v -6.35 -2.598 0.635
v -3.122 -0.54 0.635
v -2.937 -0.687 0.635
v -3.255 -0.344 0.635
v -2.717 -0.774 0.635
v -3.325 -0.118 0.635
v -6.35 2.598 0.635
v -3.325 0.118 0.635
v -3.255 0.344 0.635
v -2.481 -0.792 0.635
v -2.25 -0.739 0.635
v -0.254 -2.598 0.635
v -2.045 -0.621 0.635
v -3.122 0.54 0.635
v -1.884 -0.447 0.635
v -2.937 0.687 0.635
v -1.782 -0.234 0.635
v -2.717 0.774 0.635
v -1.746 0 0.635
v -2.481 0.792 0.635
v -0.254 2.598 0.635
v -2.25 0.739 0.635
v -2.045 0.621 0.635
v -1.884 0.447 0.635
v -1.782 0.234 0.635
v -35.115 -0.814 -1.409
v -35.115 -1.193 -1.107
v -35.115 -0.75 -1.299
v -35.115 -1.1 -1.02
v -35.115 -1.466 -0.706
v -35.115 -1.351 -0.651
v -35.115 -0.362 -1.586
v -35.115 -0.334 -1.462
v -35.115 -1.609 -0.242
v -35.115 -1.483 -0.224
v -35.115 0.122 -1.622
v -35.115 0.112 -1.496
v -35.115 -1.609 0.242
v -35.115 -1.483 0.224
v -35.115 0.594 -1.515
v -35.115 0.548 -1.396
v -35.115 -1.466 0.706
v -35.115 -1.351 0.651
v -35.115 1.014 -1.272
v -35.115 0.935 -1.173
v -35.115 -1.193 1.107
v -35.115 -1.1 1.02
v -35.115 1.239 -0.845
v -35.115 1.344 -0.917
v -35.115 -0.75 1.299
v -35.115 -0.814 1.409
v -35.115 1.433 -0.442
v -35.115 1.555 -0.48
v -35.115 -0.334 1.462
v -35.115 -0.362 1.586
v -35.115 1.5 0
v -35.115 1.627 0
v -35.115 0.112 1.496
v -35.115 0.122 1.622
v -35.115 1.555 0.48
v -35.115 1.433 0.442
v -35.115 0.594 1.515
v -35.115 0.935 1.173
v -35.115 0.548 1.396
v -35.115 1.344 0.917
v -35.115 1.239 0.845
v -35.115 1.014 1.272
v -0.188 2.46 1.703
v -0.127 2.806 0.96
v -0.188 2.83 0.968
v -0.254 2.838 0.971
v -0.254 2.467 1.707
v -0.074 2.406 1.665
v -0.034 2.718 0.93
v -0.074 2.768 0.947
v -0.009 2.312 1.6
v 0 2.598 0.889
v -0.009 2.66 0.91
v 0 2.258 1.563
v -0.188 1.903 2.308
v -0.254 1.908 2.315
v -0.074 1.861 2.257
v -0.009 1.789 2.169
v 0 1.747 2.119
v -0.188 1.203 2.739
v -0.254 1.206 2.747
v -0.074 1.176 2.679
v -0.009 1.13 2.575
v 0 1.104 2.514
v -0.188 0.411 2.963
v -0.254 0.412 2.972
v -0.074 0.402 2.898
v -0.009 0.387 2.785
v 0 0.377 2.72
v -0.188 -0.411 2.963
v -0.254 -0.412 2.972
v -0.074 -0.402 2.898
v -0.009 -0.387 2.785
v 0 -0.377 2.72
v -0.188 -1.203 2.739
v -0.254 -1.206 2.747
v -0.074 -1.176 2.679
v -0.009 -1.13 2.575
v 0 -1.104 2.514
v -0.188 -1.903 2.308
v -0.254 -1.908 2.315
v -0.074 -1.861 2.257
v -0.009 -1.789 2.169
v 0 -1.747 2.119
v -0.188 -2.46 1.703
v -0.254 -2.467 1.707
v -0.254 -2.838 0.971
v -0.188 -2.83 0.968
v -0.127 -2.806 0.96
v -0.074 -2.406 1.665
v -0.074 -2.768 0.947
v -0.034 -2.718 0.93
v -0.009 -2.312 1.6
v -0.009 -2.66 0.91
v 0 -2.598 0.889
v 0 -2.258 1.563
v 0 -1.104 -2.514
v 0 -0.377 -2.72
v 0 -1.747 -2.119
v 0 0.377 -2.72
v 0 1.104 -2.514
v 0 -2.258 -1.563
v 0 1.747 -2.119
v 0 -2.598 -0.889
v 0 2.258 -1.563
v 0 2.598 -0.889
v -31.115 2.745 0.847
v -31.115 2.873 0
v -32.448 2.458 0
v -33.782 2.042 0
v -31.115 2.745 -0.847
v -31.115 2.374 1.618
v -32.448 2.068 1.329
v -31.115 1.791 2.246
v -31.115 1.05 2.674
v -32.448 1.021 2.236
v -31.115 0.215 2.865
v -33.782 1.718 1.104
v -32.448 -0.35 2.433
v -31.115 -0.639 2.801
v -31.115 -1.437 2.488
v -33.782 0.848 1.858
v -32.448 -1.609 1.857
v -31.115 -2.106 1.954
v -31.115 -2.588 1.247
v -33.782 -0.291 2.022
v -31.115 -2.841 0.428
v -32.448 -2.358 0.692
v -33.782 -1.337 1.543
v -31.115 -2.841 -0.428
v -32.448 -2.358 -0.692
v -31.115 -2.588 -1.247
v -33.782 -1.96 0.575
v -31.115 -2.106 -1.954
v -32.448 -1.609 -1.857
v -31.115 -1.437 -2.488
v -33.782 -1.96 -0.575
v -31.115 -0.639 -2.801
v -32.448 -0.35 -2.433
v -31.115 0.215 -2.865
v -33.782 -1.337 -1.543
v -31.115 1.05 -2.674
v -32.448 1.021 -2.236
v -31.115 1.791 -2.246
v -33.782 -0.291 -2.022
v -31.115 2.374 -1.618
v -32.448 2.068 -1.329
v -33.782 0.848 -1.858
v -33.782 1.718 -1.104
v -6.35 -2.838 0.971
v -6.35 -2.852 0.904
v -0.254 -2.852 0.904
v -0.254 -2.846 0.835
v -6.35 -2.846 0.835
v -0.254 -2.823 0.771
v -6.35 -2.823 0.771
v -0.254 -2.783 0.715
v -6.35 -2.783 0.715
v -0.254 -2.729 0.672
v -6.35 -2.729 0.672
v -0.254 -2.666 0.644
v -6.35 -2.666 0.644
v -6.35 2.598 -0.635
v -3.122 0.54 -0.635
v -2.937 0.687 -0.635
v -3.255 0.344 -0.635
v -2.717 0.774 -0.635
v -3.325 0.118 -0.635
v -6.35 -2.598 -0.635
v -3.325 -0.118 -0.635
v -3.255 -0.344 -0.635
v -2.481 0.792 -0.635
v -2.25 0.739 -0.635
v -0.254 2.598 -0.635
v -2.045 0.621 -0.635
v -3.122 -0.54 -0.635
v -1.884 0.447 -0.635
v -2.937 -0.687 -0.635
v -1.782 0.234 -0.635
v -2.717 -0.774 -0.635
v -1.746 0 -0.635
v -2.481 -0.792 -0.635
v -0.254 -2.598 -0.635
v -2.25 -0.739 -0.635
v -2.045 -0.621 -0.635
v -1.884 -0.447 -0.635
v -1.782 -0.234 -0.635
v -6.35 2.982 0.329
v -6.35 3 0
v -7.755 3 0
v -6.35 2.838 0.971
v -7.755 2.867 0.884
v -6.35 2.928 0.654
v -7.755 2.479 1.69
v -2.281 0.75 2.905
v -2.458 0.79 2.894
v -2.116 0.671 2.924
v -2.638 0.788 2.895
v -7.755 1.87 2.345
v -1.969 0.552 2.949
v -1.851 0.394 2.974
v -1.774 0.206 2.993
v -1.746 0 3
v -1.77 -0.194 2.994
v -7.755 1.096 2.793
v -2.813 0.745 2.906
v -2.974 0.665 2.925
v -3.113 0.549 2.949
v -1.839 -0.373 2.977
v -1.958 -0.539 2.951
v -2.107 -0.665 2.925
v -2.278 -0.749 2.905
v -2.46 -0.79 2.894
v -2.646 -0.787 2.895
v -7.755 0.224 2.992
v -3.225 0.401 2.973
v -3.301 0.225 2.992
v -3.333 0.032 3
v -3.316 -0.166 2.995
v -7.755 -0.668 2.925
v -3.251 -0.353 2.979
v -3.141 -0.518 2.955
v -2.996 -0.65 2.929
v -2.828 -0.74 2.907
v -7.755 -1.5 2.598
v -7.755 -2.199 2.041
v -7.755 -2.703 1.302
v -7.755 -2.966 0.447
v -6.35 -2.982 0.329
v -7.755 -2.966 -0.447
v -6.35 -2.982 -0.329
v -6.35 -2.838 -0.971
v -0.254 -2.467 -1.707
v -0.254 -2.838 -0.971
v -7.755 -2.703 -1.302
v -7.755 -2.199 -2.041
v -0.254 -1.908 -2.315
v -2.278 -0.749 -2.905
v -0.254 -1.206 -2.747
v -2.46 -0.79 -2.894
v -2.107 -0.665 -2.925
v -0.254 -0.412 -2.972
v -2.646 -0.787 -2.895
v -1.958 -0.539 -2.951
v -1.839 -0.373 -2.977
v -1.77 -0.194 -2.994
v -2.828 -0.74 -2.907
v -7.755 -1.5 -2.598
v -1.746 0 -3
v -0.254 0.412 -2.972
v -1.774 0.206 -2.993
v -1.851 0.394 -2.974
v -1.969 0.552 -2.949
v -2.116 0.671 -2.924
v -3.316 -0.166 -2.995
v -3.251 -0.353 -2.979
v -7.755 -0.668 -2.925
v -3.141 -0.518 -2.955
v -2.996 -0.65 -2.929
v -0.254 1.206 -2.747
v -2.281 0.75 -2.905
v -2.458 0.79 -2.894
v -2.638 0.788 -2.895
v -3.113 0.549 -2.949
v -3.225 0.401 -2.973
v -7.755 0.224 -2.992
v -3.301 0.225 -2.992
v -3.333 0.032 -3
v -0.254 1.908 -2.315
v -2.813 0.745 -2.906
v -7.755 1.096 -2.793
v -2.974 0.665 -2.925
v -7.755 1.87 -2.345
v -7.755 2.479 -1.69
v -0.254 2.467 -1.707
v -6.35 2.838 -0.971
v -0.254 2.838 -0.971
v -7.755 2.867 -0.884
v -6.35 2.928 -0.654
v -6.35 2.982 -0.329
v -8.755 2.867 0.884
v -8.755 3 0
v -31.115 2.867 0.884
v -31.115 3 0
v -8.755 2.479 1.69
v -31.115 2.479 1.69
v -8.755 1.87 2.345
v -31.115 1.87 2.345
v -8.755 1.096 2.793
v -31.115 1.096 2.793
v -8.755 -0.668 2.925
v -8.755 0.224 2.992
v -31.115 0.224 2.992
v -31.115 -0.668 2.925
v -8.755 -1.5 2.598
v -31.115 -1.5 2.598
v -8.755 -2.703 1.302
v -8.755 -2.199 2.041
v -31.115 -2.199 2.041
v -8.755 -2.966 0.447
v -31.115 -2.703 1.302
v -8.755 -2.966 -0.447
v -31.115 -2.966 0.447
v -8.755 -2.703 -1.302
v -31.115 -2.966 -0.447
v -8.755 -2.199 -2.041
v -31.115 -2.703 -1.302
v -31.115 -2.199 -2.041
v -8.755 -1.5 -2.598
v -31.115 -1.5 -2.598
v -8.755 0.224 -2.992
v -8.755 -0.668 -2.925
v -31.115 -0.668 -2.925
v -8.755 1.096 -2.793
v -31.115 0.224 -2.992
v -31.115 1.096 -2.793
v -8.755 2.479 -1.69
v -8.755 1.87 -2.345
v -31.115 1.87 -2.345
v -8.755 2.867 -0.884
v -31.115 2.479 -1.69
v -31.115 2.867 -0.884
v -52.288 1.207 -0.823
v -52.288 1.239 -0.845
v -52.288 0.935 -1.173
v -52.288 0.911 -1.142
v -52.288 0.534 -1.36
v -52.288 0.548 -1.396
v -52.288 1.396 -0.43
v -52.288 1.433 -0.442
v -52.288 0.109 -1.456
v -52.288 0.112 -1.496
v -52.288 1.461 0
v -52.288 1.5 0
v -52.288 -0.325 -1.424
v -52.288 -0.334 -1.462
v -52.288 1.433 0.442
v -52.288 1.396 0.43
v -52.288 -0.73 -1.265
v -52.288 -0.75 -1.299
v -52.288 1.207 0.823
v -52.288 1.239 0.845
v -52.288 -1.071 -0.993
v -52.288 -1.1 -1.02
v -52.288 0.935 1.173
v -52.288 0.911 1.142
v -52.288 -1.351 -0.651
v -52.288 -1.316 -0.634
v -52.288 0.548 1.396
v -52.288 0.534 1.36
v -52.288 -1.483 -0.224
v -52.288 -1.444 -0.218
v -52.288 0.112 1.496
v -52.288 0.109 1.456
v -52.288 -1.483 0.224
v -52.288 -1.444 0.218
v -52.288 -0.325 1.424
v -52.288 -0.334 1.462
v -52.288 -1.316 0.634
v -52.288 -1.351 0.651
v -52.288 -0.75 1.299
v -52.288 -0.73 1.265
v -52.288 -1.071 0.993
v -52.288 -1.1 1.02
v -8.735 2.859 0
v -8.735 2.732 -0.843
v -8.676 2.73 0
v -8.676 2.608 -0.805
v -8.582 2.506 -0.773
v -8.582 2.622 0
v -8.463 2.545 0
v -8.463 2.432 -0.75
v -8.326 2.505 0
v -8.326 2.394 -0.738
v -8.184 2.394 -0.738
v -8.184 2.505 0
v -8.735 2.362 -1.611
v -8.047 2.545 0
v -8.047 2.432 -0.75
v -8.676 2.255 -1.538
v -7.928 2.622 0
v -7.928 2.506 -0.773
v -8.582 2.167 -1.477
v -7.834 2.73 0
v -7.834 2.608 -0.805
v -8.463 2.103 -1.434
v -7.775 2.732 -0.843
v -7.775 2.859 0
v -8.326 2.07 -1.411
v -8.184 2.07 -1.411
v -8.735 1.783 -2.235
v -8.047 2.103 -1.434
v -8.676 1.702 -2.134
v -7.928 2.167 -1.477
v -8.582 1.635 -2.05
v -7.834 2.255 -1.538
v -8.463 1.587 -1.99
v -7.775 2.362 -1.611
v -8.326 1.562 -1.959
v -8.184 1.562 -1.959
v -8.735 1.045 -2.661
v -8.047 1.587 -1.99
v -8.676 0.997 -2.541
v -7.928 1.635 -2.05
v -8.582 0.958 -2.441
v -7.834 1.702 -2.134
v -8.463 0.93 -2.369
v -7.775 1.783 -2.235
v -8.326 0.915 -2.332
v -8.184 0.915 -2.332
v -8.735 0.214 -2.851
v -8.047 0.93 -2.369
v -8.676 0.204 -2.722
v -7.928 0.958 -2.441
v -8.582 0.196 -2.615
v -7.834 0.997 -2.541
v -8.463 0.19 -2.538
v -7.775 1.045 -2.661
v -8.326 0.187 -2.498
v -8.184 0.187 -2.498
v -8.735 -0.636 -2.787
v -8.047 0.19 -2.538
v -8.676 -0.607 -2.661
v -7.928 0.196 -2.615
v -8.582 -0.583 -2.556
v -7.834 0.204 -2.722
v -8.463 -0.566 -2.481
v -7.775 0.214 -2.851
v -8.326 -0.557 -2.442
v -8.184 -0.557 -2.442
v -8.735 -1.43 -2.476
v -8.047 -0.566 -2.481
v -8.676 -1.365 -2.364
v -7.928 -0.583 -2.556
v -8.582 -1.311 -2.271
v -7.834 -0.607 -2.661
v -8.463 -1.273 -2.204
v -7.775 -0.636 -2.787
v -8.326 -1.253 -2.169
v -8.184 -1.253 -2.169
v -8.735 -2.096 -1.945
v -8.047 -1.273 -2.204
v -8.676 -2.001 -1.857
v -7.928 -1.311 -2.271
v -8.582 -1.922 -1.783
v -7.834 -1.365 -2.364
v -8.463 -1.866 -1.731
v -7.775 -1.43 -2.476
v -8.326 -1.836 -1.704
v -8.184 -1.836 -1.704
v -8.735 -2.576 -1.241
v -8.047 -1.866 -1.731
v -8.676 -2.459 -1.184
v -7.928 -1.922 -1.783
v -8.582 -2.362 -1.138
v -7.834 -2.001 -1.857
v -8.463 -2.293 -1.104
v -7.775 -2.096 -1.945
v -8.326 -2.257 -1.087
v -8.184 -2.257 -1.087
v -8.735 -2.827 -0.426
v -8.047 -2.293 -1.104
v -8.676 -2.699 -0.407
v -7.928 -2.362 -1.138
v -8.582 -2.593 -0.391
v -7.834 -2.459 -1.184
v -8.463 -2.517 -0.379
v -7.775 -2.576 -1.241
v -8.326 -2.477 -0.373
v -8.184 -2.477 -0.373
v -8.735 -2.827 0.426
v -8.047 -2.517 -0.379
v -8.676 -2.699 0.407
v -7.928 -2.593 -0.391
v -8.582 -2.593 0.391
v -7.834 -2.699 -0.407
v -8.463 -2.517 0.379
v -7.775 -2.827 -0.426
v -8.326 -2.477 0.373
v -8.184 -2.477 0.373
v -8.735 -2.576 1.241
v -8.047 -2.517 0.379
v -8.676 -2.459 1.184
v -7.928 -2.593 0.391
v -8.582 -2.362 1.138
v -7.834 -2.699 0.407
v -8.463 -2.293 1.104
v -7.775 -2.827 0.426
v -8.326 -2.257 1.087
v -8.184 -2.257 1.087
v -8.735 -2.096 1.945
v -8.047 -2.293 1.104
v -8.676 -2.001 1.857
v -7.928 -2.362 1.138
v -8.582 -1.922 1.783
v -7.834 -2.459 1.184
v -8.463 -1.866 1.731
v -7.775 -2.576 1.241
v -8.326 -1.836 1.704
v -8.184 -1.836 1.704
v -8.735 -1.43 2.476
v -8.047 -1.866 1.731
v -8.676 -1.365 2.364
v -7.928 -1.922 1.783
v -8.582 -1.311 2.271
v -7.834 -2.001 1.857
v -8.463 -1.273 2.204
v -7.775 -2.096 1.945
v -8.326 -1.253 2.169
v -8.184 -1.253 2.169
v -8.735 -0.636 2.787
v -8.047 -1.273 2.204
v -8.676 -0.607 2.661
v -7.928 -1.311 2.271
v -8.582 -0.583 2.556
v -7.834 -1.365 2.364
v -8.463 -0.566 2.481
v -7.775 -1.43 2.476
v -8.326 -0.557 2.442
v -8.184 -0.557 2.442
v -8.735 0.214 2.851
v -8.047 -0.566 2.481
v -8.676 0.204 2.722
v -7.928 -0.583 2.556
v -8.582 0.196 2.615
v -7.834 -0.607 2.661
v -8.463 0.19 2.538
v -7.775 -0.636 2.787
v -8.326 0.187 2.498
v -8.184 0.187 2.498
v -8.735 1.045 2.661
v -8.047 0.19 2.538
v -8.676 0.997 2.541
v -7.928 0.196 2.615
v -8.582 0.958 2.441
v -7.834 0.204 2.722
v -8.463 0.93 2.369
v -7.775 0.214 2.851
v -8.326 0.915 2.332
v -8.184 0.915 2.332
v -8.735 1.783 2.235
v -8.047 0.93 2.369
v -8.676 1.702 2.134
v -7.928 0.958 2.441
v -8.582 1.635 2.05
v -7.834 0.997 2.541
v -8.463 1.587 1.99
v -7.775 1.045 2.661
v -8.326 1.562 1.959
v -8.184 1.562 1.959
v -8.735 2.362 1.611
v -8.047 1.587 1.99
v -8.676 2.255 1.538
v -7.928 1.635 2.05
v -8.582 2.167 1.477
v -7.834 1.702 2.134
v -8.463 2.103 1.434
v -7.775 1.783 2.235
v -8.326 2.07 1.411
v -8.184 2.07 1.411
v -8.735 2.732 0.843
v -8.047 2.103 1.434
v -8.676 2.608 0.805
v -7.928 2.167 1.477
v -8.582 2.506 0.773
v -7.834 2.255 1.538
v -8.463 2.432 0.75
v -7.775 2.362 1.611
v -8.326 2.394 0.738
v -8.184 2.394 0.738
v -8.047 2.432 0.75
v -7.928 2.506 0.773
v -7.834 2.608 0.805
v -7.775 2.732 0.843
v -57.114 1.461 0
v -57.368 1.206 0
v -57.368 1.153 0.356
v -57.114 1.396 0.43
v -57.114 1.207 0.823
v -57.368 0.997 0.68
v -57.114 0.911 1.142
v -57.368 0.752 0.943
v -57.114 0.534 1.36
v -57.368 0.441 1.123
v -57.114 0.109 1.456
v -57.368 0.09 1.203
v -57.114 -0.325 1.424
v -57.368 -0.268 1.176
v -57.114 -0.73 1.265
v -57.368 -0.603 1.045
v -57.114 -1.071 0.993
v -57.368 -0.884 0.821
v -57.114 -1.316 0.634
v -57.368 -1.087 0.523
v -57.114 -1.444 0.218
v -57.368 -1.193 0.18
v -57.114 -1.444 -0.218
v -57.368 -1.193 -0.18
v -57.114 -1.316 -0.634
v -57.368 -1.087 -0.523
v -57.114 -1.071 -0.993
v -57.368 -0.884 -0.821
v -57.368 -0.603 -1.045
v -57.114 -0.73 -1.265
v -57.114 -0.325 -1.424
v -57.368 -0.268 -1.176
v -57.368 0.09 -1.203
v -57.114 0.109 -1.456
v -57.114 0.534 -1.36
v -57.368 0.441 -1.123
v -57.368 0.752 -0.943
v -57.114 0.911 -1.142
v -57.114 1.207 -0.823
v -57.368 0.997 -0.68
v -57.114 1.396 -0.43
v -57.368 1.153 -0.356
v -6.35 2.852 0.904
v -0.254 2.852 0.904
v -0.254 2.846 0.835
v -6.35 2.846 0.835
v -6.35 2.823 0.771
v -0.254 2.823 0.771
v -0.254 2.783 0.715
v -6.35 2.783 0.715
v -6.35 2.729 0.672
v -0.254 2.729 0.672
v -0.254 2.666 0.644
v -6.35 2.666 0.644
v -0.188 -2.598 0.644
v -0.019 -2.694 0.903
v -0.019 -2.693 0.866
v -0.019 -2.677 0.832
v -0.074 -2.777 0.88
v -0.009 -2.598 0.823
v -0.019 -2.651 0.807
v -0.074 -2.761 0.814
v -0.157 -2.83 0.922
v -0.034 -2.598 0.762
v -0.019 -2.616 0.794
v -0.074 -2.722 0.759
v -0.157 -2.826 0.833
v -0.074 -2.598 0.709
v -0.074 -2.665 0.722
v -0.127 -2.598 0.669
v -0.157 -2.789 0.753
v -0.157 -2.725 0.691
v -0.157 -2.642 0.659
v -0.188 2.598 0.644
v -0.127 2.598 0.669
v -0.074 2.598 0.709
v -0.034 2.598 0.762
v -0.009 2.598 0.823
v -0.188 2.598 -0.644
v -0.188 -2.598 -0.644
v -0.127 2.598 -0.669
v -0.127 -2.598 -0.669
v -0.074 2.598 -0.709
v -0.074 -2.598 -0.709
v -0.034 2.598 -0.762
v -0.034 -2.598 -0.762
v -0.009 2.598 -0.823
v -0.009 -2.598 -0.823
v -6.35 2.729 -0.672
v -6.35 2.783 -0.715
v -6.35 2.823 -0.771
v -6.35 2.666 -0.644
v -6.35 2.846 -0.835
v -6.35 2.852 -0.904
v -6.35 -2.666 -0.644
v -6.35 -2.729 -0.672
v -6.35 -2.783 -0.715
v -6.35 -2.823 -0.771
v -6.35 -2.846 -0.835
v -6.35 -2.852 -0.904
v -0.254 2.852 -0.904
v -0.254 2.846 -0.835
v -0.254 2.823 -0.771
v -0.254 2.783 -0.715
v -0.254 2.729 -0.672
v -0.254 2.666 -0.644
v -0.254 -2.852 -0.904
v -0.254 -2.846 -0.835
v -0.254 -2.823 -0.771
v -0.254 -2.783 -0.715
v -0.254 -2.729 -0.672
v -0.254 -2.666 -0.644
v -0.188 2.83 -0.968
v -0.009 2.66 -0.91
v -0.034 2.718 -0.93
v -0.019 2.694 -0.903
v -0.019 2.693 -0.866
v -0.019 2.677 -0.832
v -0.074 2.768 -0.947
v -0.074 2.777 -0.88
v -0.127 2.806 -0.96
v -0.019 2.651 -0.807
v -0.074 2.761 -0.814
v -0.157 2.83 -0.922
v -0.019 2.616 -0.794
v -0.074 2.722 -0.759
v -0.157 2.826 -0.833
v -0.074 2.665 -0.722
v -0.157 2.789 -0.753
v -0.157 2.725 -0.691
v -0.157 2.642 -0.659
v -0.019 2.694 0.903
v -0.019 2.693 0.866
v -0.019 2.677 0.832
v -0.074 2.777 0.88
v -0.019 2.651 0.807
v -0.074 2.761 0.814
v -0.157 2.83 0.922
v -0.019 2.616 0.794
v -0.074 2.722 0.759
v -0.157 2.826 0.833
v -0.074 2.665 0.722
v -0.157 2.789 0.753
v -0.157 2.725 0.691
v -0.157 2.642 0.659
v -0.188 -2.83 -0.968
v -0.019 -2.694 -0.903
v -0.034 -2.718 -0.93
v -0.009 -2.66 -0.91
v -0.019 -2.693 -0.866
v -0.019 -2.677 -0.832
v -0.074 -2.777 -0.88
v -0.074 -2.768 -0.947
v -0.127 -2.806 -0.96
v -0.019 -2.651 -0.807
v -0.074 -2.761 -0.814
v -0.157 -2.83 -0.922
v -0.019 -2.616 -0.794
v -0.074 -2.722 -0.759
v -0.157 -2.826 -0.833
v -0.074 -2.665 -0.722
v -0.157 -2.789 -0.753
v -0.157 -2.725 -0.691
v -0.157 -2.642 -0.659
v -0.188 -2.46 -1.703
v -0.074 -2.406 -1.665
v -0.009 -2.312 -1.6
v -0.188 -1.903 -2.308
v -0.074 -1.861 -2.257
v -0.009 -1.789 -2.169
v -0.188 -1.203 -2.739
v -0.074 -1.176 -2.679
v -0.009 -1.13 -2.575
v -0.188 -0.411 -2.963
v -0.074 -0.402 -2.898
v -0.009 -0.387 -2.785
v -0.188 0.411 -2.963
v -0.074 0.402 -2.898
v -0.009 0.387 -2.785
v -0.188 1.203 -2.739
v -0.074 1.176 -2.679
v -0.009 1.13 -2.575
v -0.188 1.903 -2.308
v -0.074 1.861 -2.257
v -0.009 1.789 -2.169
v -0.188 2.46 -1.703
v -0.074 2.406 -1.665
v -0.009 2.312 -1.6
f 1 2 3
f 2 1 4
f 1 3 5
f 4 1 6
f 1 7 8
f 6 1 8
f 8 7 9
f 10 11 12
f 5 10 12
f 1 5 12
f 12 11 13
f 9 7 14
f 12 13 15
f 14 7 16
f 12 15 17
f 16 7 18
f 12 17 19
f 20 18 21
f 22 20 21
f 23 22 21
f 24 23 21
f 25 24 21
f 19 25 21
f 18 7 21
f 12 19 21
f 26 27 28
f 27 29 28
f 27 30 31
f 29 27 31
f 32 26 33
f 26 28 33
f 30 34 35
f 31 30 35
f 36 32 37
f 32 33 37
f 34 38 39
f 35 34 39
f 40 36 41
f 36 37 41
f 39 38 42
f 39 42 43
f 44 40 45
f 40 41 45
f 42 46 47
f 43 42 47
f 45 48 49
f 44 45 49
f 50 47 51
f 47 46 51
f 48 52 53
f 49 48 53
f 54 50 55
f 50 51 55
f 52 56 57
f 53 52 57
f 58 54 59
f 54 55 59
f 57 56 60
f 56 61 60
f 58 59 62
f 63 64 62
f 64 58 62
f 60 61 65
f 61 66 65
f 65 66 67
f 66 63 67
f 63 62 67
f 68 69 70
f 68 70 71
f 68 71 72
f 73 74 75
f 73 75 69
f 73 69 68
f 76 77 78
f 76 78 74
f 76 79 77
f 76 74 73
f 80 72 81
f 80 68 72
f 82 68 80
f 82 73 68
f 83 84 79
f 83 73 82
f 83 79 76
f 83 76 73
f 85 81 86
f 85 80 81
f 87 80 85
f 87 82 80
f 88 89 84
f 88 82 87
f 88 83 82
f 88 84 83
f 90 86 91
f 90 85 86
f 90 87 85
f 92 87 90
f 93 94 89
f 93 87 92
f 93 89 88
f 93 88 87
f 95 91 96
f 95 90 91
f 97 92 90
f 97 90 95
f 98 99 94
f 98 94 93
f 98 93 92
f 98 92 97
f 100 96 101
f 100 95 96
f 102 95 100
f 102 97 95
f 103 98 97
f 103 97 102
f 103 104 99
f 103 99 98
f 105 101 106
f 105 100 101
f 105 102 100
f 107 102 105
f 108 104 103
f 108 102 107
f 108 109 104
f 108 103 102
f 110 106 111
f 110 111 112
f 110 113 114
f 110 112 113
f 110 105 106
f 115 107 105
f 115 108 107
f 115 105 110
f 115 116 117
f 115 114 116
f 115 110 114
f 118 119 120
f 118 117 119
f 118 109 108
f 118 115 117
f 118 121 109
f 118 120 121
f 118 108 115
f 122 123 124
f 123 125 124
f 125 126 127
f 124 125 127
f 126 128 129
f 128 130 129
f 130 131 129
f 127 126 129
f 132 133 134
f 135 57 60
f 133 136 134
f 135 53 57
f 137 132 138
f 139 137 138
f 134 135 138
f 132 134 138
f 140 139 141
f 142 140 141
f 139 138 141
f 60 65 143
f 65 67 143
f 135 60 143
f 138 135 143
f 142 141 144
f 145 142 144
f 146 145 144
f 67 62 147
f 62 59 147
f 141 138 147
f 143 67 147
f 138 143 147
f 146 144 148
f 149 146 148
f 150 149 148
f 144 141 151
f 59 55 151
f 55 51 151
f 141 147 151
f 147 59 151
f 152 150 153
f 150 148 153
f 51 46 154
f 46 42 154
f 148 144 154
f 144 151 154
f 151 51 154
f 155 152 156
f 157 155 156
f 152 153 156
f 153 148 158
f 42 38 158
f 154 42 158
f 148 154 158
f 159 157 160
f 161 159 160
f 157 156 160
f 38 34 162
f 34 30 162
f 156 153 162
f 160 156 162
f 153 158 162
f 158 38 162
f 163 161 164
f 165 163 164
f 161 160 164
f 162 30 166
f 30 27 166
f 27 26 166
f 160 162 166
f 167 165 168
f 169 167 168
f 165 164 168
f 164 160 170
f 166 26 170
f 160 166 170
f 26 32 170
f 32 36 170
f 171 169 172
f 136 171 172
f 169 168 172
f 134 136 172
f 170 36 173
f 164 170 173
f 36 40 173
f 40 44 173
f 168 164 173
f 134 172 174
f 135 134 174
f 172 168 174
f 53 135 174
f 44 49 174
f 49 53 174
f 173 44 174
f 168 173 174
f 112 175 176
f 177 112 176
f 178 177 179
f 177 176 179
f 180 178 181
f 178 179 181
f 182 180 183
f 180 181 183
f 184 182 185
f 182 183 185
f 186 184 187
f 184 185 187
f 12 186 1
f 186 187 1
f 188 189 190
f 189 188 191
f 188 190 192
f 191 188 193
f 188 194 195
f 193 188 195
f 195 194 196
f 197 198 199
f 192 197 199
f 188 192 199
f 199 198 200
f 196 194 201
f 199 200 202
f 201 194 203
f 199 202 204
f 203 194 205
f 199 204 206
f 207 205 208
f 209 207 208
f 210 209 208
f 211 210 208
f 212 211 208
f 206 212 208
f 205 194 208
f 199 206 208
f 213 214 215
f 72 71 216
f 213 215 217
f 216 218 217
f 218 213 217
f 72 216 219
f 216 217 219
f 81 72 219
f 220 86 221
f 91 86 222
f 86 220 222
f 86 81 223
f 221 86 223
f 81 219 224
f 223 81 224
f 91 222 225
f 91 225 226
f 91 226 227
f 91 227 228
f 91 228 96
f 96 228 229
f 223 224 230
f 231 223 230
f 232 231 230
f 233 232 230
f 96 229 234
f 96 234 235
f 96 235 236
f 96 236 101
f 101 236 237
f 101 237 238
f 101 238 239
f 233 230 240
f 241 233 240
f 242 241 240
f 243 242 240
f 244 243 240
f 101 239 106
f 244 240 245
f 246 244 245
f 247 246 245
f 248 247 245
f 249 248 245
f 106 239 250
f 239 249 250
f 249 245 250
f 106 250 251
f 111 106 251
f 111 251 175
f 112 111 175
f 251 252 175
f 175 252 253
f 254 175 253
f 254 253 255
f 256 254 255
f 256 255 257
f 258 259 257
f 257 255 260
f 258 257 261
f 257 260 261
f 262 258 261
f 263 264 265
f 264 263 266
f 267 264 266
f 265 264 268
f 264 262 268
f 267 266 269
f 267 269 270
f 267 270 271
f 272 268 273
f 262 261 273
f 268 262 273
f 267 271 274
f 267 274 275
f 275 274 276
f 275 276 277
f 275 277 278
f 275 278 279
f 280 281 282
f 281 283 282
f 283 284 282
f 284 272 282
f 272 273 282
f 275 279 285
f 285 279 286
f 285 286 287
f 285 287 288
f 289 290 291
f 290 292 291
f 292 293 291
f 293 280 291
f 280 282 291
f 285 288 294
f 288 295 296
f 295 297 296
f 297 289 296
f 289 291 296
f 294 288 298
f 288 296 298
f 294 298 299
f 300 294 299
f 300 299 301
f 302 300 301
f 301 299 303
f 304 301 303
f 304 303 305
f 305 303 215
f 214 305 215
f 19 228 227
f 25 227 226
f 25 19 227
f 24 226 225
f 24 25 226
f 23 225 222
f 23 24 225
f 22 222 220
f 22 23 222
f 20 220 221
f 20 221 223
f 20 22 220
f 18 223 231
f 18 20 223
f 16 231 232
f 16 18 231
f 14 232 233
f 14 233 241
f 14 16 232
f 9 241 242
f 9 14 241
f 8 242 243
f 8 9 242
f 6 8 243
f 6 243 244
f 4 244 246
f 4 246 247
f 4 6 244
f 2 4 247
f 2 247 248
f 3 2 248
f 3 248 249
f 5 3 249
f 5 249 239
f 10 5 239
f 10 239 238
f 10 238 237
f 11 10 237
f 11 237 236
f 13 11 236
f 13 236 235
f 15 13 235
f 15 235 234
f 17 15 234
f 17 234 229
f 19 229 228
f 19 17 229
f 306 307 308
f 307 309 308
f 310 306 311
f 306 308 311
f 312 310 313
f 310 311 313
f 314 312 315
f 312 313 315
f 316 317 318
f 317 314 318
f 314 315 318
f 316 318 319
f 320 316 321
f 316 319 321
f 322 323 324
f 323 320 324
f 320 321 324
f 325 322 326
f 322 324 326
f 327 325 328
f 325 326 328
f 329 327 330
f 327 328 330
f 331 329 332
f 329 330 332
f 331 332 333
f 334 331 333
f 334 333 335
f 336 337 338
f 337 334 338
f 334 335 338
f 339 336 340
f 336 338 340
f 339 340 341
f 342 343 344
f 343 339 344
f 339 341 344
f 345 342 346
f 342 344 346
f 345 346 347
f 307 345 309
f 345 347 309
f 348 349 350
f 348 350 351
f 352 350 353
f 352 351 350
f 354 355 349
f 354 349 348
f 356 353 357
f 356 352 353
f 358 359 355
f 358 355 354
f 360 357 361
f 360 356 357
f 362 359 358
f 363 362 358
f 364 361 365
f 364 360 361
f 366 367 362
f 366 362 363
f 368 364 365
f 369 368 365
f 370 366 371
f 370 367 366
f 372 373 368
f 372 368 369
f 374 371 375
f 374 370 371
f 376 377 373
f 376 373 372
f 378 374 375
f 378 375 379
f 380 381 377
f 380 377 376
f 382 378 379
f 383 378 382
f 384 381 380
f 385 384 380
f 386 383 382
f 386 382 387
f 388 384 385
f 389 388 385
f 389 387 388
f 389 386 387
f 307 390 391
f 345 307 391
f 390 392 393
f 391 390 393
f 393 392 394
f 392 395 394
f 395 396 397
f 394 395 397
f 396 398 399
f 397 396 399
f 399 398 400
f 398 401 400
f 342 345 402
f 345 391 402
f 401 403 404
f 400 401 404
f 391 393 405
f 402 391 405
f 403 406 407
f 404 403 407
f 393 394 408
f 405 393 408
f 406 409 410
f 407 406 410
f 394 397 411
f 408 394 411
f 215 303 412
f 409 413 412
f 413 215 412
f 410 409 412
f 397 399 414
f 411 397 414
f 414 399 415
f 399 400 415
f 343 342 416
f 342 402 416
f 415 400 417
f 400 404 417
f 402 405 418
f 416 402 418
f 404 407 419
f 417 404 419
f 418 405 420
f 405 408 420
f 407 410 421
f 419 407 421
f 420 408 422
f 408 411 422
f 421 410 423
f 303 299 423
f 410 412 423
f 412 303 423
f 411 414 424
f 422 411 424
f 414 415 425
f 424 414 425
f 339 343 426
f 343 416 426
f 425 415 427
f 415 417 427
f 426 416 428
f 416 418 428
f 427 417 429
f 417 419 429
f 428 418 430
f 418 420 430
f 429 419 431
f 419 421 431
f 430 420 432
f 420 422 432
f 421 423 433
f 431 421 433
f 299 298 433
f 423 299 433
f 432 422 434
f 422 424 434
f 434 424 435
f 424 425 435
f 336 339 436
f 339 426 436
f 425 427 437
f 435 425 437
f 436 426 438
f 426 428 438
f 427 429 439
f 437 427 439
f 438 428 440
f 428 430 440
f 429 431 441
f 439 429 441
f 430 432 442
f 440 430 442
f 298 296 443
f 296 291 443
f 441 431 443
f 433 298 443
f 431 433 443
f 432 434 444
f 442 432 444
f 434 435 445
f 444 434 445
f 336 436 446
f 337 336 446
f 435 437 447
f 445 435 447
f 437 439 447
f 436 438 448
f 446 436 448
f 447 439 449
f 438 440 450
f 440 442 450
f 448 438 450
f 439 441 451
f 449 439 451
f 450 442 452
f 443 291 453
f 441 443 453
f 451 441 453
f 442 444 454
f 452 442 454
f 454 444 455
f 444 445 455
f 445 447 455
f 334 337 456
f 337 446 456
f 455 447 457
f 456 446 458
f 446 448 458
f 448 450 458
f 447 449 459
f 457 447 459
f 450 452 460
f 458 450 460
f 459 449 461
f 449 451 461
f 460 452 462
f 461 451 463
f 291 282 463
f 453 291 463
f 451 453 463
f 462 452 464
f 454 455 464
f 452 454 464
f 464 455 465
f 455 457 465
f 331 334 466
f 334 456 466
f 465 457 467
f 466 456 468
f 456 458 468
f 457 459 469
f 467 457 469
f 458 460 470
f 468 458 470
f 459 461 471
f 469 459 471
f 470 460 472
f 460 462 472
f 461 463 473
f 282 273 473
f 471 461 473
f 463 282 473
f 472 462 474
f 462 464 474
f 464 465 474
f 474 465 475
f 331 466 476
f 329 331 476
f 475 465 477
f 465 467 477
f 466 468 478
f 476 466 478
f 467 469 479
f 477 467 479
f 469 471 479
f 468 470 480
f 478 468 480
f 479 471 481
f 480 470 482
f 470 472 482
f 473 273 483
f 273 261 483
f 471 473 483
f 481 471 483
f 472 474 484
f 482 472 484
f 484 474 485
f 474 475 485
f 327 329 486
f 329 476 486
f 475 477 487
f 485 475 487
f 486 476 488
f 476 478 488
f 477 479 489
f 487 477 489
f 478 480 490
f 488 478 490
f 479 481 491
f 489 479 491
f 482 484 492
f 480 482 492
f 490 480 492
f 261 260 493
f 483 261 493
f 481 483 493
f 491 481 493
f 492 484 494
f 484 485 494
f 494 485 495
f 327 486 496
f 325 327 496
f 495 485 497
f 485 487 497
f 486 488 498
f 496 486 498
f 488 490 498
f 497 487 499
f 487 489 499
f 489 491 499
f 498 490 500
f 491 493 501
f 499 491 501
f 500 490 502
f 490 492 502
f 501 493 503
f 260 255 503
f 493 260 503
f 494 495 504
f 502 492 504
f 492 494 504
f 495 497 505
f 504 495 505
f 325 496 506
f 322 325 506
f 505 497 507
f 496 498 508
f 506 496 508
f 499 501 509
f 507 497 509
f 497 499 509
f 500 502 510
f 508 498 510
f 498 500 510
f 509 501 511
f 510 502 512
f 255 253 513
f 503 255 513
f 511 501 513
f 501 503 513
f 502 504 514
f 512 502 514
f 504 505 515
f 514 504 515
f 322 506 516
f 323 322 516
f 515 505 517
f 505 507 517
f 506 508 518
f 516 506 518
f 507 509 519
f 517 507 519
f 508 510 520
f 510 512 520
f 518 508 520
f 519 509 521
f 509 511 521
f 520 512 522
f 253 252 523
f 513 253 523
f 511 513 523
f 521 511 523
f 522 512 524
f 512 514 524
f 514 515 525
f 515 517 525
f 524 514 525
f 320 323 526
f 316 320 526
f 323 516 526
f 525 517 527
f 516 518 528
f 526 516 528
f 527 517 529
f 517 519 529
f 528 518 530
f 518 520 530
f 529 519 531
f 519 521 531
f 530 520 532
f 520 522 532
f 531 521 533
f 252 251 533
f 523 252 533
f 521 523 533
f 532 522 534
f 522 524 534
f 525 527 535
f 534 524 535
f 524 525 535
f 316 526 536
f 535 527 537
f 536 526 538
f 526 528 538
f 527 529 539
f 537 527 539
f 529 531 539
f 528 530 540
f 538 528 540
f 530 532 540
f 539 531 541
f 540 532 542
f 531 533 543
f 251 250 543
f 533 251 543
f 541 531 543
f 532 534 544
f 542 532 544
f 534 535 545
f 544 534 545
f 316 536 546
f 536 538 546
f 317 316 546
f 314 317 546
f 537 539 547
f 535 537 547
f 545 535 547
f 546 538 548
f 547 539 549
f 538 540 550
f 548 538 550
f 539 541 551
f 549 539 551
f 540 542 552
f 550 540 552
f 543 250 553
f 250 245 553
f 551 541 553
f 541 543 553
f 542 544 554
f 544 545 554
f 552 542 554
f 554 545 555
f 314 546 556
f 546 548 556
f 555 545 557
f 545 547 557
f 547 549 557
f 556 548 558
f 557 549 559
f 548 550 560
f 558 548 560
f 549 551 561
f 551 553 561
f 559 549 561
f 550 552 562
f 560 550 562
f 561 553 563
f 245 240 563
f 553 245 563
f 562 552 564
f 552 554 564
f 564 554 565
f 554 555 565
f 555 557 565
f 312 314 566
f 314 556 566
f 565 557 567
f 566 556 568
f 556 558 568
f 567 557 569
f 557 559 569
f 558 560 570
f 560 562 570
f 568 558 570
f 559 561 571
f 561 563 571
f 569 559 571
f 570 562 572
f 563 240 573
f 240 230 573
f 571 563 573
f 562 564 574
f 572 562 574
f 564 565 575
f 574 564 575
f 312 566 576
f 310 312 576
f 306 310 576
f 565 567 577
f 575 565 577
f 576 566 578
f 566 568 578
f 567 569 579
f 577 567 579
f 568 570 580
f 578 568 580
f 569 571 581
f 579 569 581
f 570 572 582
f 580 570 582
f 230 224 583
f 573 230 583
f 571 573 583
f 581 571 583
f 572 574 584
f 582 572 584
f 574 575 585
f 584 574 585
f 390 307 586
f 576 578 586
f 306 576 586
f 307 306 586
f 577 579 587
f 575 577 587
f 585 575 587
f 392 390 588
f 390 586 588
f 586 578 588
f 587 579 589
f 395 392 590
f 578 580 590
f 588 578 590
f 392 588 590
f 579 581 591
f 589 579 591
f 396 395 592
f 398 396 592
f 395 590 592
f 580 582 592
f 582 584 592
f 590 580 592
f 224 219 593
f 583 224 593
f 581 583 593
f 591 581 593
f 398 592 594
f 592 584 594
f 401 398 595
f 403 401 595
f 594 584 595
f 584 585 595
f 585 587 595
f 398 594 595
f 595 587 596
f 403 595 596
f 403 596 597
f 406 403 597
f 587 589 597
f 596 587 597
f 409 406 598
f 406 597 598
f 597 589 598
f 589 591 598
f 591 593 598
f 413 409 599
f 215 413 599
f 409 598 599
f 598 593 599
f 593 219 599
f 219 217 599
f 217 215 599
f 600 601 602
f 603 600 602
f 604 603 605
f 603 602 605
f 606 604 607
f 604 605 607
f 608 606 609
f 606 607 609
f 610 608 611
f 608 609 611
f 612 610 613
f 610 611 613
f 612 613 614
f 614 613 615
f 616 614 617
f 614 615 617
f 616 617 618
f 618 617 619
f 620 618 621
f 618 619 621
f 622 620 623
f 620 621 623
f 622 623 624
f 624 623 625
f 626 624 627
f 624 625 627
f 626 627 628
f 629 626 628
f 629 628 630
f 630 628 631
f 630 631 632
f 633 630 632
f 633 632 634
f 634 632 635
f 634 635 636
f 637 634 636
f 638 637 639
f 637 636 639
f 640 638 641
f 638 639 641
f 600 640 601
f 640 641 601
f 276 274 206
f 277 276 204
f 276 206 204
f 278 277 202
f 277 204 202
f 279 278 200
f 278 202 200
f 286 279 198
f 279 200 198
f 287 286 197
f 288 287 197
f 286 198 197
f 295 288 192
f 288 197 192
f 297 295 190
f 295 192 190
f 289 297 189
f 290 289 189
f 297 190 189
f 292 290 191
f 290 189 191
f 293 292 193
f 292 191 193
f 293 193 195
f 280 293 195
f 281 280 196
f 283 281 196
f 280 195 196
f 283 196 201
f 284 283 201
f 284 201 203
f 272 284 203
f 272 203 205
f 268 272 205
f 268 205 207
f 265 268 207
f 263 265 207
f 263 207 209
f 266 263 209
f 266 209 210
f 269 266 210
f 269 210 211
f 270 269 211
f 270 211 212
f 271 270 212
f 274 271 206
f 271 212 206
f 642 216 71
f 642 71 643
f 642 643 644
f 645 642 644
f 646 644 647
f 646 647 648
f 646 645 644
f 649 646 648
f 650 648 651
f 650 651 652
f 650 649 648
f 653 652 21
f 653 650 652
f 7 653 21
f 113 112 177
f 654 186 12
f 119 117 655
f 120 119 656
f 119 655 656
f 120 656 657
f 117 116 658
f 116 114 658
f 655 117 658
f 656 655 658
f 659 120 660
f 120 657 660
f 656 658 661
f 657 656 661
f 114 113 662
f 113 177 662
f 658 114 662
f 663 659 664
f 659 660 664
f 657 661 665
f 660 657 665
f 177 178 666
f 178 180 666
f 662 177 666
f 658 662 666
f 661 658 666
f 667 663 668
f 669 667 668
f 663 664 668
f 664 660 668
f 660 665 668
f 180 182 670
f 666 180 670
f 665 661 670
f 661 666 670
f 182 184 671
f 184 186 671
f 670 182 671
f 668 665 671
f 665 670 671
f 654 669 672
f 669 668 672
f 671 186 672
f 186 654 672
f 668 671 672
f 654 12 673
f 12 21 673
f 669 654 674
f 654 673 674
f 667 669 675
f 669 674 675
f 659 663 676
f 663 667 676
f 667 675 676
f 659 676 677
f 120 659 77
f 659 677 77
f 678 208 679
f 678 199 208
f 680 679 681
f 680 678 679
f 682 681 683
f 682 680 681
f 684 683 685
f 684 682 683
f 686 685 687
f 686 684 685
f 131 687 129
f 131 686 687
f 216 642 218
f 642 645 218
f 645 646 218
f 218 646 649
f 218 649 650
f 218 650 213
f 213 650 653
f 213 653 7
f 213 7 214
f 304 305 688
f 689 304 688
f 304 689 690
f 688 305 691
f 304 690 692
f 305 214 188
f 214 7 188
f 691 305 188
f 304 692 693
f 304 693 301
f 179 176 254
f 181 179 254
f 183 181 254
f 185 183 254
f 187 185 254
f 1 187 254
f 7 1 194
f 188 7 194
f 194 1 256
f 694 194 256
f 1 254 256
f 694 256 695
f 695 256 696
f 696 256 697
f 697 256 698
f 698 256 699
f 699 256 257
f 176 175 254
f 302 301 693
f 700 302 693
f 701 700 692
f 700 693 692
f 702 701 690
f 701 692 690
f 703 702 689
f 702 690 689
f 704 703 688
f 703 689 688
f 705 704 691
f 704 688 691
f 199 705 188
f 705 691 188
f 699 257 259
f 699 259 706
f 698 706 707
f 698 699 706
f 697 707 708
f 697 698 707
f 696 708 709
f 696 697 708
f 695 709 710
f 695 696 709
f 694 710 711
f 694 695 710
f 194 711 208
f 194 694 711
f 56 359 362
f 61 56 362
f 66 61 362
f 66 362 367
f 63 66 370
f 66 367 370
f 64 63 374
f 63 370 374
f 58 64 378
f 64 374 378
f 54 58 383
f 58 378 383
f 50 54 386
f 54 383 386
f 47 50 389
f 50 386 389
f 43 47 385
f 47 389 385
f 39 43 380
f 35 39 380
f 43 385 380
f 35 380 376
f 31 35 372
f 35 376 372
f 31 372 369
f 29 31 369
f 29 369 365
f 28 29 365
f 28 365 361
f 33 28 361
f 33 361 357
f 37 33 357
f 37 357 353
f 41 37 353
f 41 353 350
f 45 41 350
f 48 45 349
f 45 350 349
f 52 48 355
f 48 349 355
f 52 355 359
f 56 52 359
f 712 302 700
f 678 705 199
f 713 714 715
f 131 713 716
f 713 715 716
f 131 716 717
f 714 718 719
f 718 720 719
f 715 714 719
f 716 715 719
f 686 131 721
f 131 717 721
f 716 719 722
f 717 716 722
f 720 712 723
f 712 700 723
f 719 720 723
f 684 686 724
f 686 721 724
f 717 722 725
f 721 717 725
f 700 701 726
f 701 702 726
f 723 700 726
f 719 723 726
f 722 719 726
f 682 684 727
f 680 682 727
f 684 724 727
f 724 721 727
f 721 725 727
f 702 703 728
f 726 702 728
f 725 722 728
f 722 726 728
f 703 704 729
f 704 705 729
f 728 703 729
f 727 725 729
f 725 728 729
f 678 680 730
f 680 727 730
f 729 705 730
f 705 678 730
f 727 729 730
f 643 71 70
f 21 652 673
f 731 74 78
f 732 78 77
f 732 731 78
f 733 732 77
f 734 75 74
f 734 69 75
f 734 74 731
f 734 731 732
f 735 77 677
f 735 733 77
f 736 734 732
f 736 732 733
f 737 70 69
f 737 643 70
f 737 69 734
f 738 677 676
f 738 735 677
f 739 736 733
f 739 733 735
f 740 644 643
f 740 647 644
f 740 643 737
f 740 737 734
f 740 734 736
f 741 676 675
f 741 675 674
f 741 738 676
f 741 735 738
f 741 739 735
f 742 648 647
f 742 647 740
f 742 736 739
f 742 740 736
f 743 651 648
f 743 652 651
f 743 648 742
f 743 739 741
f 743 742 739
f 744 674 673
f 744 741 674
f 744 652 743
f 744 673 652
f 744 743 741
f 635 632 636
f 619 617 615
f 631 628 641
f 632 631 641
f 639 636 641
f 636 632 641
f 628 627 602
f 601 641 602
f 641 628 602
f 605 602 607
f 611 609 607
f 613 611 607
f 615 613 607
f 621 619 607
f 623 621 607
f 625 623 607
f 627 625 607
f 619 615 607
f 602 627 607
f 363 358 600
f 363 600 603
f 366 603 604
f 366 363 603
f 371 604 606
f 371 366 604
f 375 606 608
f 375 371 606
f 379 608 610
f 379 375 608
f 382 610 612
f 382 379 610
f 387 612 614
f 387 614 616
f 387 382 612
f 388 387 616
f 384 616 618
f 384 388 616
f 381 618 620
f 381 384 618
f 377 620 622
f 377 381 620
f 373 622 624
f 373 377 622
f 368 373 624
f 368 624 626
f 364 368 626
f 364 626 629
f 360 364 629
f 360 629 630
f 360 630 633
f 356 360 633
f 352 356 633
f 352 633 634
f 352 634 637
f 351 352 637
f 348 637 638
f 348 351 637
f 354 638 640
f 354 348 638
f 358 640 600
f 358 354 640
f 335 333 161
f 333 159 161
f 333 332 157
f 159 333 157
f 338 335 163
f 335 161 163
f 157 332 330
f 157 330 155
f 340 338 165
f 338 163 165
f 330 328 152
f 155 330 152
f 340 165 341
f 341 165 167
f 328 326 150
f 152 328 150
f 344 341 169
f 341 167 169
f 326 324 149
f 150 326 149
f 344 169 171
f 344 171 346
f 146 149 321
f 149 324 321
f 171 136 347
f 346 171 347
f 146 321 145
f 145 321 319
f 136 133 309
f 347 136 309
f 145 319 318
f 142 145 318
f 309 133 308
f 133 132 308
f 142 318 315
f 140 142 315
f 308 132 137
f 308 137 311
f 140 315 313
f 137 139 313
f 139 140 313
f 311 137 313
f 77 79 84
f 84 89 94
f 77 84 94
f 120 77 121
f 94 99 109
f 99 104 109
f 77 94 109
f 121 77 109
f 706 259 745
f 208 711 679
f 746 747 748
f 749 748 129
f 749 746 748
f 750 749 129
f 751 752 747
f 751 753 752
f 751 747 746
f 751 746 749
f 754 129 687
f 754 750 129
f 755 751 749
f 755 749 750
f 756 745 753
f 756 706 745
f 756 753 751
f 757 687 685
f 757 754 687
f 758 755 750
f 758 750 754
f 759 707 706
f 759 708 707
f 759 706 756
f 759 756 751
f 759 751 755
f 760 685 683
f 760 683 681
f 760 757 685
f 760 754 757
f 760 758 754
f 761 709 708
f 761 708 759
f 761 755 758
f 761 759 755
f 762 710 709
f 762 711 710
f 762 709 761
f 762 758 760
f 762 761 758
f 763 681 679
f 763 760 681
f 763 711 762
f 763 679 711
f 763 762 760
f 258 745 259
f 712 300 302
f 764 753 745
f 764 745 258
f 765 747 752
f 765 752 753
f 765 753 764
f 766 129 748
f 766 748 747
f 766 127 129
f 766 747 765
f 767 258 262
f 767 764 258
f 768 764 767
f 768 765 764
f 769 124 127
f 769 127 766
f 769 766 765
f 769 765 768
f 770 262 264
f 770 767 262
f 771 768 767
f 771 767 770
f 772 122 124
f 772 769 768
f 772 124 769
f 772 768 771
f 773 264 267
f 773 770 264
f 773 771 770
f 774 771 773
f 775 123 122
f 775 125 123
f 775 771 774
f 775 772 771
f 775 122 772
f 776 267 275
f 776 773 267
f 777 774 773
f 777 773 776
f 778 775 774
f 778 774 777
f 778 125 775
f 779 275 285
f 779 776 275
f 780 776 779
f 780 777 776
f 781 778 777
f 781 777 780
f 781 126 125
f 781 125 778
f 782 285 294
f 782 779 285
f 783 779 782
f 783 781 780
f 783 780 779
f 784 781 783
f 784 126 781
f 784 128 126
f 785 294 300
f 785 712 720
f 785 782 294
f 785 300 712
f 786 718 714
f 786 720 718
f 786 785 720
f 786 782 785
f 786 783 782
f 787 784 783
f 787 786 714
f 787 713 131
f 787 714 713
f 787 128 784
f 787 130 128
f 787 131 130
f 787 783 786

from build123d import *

# Parameters (mm, degrees)
ESQUISSE2_W                  = 12.7
ESQUISSE2_H                  = 1.27
ENL_V_MAT_EXTRU_1_DEPTH      = 4
ENL_V_MAT_EXTRU_1_DEPTH_BACK = 4
ESQUISSE3_R                  = 0.79375
ENL_V_MAT_EXTRU_2_DEPTH      = 4
ENL_V_MAT_EXTRU_2_DEPTH_BACK = 4
ESQUISSE4_W                  = 5.08
ESQUISSE4_H                  = 0.0395
CHANFREIN1_SIZE              = 0.254
CONG_1_R                     = 0.254
ESQUISSE5_R                  = 0.5


with BuildPart() as part:
    # Esquisse1 → Révolution1 (revolve)
    with BuildSketch(Plane.XY):
        Polygon((0, 0), (0, 3), (-31.115, 3), (-31.115, 2.873), (-35.114992, 1.627), (-35.114992, 1.5), (-57.36844, 1.5), (-57.36844, 0), align=None)
    revolve(axis=Axis((-76.031292341, 0, 0), (1, 0, 0)))

    # Esquisse2 → Enlèv. mat.-Extru.1 (cut, two sides)
    with BuildSketch(Plane(origin=(0, 0, 0), x_dir=(1, 0, 0), z_dir=(0, 1, 0))) as enl_v_mat_extru_1_sk:
        Rectangle(ESQUISSE2_W, ESQUISSE2_H)
    extrude(amount=ENL_V_MAT_EXTRU_1_DEPTH, mode=Mode.SUBTRACT)
    extrude(enl_v_mat_extru_1_sk.sketch, amount=-ENL_V_MAT_EXTRU_1_DEPTH_BACK, mode=Mode.SUBTRACT)

    # Esquisse3 → Enlèv. mat.-Extru.2 (cut, two sides)
    with BuildSketch(Plane.XY) as enl_v_mat_extru_2_sk:
        with Locations((-2.54, 0)):
            Circle(ESQUISSE3_R)
    extrude(amount=ENL_V_MAT_EXTRU_2_DEPTH, mode=Mode.SUBTRACT)
    extrude(enl_v_mat_extru_2_sk.sketch, amount=-ENL_V_MAT_EXTRU_2_DEPTH_BACK, mode=Mode.SUBTRACT)

    # Esquisse4 → Enlèvement de matière-Révolution1 (revolve, cut)
    with BuildSketch(Plane.XY):
        with Locations((-54.82844, 1.48025)):
            Rectangle(ESQUISSE4_W, ESQUISSE4_H)
    revolve(axis=Axis((-63.433068243, 0, 0), (1, 0, 0)), mode=Mode.SUBTRACT)

    # Chanfrein1
    chanfrein1_edges = [part.edges().sort_by_distance(p)[0] for p in [
        (-57.36844, -1.4605, 0),
    ]]
    chamfer(chanfrein1_edges, length=CHANFREIN1_SIZE)

    # Congé1
    cong_1_edges = [part.edges().sort_by_distance(p)[0] for p in [
        (0, 0, 3),
        (0, 0, -3),
        (0, 0, -0.635),
        (0, 0, 0.635),
        (-3.175, 2.93202575, 0.635),
        (-3.175, -2.93202575, 0.635),
        (-3.175, -2.93202575, -0.635),
        (-3.175, 2.93202575, -0.635),
    ]]
    fillet(cong_1_edges, radius=CONG_1_R)

    # Esquisse5 → Enlèvement de matière-Révolution2 (revolve, cut)
    with BuildSketch(Plane.XY):
        with Locations((-8.255, 3)):
            Circle(ESQUISSE5_R)
    revolve(axis=Axis((-76.031292341, 0, 0), (-1, 0, 0)), mode=Mode.SUBTRACT)


solid = part.part
